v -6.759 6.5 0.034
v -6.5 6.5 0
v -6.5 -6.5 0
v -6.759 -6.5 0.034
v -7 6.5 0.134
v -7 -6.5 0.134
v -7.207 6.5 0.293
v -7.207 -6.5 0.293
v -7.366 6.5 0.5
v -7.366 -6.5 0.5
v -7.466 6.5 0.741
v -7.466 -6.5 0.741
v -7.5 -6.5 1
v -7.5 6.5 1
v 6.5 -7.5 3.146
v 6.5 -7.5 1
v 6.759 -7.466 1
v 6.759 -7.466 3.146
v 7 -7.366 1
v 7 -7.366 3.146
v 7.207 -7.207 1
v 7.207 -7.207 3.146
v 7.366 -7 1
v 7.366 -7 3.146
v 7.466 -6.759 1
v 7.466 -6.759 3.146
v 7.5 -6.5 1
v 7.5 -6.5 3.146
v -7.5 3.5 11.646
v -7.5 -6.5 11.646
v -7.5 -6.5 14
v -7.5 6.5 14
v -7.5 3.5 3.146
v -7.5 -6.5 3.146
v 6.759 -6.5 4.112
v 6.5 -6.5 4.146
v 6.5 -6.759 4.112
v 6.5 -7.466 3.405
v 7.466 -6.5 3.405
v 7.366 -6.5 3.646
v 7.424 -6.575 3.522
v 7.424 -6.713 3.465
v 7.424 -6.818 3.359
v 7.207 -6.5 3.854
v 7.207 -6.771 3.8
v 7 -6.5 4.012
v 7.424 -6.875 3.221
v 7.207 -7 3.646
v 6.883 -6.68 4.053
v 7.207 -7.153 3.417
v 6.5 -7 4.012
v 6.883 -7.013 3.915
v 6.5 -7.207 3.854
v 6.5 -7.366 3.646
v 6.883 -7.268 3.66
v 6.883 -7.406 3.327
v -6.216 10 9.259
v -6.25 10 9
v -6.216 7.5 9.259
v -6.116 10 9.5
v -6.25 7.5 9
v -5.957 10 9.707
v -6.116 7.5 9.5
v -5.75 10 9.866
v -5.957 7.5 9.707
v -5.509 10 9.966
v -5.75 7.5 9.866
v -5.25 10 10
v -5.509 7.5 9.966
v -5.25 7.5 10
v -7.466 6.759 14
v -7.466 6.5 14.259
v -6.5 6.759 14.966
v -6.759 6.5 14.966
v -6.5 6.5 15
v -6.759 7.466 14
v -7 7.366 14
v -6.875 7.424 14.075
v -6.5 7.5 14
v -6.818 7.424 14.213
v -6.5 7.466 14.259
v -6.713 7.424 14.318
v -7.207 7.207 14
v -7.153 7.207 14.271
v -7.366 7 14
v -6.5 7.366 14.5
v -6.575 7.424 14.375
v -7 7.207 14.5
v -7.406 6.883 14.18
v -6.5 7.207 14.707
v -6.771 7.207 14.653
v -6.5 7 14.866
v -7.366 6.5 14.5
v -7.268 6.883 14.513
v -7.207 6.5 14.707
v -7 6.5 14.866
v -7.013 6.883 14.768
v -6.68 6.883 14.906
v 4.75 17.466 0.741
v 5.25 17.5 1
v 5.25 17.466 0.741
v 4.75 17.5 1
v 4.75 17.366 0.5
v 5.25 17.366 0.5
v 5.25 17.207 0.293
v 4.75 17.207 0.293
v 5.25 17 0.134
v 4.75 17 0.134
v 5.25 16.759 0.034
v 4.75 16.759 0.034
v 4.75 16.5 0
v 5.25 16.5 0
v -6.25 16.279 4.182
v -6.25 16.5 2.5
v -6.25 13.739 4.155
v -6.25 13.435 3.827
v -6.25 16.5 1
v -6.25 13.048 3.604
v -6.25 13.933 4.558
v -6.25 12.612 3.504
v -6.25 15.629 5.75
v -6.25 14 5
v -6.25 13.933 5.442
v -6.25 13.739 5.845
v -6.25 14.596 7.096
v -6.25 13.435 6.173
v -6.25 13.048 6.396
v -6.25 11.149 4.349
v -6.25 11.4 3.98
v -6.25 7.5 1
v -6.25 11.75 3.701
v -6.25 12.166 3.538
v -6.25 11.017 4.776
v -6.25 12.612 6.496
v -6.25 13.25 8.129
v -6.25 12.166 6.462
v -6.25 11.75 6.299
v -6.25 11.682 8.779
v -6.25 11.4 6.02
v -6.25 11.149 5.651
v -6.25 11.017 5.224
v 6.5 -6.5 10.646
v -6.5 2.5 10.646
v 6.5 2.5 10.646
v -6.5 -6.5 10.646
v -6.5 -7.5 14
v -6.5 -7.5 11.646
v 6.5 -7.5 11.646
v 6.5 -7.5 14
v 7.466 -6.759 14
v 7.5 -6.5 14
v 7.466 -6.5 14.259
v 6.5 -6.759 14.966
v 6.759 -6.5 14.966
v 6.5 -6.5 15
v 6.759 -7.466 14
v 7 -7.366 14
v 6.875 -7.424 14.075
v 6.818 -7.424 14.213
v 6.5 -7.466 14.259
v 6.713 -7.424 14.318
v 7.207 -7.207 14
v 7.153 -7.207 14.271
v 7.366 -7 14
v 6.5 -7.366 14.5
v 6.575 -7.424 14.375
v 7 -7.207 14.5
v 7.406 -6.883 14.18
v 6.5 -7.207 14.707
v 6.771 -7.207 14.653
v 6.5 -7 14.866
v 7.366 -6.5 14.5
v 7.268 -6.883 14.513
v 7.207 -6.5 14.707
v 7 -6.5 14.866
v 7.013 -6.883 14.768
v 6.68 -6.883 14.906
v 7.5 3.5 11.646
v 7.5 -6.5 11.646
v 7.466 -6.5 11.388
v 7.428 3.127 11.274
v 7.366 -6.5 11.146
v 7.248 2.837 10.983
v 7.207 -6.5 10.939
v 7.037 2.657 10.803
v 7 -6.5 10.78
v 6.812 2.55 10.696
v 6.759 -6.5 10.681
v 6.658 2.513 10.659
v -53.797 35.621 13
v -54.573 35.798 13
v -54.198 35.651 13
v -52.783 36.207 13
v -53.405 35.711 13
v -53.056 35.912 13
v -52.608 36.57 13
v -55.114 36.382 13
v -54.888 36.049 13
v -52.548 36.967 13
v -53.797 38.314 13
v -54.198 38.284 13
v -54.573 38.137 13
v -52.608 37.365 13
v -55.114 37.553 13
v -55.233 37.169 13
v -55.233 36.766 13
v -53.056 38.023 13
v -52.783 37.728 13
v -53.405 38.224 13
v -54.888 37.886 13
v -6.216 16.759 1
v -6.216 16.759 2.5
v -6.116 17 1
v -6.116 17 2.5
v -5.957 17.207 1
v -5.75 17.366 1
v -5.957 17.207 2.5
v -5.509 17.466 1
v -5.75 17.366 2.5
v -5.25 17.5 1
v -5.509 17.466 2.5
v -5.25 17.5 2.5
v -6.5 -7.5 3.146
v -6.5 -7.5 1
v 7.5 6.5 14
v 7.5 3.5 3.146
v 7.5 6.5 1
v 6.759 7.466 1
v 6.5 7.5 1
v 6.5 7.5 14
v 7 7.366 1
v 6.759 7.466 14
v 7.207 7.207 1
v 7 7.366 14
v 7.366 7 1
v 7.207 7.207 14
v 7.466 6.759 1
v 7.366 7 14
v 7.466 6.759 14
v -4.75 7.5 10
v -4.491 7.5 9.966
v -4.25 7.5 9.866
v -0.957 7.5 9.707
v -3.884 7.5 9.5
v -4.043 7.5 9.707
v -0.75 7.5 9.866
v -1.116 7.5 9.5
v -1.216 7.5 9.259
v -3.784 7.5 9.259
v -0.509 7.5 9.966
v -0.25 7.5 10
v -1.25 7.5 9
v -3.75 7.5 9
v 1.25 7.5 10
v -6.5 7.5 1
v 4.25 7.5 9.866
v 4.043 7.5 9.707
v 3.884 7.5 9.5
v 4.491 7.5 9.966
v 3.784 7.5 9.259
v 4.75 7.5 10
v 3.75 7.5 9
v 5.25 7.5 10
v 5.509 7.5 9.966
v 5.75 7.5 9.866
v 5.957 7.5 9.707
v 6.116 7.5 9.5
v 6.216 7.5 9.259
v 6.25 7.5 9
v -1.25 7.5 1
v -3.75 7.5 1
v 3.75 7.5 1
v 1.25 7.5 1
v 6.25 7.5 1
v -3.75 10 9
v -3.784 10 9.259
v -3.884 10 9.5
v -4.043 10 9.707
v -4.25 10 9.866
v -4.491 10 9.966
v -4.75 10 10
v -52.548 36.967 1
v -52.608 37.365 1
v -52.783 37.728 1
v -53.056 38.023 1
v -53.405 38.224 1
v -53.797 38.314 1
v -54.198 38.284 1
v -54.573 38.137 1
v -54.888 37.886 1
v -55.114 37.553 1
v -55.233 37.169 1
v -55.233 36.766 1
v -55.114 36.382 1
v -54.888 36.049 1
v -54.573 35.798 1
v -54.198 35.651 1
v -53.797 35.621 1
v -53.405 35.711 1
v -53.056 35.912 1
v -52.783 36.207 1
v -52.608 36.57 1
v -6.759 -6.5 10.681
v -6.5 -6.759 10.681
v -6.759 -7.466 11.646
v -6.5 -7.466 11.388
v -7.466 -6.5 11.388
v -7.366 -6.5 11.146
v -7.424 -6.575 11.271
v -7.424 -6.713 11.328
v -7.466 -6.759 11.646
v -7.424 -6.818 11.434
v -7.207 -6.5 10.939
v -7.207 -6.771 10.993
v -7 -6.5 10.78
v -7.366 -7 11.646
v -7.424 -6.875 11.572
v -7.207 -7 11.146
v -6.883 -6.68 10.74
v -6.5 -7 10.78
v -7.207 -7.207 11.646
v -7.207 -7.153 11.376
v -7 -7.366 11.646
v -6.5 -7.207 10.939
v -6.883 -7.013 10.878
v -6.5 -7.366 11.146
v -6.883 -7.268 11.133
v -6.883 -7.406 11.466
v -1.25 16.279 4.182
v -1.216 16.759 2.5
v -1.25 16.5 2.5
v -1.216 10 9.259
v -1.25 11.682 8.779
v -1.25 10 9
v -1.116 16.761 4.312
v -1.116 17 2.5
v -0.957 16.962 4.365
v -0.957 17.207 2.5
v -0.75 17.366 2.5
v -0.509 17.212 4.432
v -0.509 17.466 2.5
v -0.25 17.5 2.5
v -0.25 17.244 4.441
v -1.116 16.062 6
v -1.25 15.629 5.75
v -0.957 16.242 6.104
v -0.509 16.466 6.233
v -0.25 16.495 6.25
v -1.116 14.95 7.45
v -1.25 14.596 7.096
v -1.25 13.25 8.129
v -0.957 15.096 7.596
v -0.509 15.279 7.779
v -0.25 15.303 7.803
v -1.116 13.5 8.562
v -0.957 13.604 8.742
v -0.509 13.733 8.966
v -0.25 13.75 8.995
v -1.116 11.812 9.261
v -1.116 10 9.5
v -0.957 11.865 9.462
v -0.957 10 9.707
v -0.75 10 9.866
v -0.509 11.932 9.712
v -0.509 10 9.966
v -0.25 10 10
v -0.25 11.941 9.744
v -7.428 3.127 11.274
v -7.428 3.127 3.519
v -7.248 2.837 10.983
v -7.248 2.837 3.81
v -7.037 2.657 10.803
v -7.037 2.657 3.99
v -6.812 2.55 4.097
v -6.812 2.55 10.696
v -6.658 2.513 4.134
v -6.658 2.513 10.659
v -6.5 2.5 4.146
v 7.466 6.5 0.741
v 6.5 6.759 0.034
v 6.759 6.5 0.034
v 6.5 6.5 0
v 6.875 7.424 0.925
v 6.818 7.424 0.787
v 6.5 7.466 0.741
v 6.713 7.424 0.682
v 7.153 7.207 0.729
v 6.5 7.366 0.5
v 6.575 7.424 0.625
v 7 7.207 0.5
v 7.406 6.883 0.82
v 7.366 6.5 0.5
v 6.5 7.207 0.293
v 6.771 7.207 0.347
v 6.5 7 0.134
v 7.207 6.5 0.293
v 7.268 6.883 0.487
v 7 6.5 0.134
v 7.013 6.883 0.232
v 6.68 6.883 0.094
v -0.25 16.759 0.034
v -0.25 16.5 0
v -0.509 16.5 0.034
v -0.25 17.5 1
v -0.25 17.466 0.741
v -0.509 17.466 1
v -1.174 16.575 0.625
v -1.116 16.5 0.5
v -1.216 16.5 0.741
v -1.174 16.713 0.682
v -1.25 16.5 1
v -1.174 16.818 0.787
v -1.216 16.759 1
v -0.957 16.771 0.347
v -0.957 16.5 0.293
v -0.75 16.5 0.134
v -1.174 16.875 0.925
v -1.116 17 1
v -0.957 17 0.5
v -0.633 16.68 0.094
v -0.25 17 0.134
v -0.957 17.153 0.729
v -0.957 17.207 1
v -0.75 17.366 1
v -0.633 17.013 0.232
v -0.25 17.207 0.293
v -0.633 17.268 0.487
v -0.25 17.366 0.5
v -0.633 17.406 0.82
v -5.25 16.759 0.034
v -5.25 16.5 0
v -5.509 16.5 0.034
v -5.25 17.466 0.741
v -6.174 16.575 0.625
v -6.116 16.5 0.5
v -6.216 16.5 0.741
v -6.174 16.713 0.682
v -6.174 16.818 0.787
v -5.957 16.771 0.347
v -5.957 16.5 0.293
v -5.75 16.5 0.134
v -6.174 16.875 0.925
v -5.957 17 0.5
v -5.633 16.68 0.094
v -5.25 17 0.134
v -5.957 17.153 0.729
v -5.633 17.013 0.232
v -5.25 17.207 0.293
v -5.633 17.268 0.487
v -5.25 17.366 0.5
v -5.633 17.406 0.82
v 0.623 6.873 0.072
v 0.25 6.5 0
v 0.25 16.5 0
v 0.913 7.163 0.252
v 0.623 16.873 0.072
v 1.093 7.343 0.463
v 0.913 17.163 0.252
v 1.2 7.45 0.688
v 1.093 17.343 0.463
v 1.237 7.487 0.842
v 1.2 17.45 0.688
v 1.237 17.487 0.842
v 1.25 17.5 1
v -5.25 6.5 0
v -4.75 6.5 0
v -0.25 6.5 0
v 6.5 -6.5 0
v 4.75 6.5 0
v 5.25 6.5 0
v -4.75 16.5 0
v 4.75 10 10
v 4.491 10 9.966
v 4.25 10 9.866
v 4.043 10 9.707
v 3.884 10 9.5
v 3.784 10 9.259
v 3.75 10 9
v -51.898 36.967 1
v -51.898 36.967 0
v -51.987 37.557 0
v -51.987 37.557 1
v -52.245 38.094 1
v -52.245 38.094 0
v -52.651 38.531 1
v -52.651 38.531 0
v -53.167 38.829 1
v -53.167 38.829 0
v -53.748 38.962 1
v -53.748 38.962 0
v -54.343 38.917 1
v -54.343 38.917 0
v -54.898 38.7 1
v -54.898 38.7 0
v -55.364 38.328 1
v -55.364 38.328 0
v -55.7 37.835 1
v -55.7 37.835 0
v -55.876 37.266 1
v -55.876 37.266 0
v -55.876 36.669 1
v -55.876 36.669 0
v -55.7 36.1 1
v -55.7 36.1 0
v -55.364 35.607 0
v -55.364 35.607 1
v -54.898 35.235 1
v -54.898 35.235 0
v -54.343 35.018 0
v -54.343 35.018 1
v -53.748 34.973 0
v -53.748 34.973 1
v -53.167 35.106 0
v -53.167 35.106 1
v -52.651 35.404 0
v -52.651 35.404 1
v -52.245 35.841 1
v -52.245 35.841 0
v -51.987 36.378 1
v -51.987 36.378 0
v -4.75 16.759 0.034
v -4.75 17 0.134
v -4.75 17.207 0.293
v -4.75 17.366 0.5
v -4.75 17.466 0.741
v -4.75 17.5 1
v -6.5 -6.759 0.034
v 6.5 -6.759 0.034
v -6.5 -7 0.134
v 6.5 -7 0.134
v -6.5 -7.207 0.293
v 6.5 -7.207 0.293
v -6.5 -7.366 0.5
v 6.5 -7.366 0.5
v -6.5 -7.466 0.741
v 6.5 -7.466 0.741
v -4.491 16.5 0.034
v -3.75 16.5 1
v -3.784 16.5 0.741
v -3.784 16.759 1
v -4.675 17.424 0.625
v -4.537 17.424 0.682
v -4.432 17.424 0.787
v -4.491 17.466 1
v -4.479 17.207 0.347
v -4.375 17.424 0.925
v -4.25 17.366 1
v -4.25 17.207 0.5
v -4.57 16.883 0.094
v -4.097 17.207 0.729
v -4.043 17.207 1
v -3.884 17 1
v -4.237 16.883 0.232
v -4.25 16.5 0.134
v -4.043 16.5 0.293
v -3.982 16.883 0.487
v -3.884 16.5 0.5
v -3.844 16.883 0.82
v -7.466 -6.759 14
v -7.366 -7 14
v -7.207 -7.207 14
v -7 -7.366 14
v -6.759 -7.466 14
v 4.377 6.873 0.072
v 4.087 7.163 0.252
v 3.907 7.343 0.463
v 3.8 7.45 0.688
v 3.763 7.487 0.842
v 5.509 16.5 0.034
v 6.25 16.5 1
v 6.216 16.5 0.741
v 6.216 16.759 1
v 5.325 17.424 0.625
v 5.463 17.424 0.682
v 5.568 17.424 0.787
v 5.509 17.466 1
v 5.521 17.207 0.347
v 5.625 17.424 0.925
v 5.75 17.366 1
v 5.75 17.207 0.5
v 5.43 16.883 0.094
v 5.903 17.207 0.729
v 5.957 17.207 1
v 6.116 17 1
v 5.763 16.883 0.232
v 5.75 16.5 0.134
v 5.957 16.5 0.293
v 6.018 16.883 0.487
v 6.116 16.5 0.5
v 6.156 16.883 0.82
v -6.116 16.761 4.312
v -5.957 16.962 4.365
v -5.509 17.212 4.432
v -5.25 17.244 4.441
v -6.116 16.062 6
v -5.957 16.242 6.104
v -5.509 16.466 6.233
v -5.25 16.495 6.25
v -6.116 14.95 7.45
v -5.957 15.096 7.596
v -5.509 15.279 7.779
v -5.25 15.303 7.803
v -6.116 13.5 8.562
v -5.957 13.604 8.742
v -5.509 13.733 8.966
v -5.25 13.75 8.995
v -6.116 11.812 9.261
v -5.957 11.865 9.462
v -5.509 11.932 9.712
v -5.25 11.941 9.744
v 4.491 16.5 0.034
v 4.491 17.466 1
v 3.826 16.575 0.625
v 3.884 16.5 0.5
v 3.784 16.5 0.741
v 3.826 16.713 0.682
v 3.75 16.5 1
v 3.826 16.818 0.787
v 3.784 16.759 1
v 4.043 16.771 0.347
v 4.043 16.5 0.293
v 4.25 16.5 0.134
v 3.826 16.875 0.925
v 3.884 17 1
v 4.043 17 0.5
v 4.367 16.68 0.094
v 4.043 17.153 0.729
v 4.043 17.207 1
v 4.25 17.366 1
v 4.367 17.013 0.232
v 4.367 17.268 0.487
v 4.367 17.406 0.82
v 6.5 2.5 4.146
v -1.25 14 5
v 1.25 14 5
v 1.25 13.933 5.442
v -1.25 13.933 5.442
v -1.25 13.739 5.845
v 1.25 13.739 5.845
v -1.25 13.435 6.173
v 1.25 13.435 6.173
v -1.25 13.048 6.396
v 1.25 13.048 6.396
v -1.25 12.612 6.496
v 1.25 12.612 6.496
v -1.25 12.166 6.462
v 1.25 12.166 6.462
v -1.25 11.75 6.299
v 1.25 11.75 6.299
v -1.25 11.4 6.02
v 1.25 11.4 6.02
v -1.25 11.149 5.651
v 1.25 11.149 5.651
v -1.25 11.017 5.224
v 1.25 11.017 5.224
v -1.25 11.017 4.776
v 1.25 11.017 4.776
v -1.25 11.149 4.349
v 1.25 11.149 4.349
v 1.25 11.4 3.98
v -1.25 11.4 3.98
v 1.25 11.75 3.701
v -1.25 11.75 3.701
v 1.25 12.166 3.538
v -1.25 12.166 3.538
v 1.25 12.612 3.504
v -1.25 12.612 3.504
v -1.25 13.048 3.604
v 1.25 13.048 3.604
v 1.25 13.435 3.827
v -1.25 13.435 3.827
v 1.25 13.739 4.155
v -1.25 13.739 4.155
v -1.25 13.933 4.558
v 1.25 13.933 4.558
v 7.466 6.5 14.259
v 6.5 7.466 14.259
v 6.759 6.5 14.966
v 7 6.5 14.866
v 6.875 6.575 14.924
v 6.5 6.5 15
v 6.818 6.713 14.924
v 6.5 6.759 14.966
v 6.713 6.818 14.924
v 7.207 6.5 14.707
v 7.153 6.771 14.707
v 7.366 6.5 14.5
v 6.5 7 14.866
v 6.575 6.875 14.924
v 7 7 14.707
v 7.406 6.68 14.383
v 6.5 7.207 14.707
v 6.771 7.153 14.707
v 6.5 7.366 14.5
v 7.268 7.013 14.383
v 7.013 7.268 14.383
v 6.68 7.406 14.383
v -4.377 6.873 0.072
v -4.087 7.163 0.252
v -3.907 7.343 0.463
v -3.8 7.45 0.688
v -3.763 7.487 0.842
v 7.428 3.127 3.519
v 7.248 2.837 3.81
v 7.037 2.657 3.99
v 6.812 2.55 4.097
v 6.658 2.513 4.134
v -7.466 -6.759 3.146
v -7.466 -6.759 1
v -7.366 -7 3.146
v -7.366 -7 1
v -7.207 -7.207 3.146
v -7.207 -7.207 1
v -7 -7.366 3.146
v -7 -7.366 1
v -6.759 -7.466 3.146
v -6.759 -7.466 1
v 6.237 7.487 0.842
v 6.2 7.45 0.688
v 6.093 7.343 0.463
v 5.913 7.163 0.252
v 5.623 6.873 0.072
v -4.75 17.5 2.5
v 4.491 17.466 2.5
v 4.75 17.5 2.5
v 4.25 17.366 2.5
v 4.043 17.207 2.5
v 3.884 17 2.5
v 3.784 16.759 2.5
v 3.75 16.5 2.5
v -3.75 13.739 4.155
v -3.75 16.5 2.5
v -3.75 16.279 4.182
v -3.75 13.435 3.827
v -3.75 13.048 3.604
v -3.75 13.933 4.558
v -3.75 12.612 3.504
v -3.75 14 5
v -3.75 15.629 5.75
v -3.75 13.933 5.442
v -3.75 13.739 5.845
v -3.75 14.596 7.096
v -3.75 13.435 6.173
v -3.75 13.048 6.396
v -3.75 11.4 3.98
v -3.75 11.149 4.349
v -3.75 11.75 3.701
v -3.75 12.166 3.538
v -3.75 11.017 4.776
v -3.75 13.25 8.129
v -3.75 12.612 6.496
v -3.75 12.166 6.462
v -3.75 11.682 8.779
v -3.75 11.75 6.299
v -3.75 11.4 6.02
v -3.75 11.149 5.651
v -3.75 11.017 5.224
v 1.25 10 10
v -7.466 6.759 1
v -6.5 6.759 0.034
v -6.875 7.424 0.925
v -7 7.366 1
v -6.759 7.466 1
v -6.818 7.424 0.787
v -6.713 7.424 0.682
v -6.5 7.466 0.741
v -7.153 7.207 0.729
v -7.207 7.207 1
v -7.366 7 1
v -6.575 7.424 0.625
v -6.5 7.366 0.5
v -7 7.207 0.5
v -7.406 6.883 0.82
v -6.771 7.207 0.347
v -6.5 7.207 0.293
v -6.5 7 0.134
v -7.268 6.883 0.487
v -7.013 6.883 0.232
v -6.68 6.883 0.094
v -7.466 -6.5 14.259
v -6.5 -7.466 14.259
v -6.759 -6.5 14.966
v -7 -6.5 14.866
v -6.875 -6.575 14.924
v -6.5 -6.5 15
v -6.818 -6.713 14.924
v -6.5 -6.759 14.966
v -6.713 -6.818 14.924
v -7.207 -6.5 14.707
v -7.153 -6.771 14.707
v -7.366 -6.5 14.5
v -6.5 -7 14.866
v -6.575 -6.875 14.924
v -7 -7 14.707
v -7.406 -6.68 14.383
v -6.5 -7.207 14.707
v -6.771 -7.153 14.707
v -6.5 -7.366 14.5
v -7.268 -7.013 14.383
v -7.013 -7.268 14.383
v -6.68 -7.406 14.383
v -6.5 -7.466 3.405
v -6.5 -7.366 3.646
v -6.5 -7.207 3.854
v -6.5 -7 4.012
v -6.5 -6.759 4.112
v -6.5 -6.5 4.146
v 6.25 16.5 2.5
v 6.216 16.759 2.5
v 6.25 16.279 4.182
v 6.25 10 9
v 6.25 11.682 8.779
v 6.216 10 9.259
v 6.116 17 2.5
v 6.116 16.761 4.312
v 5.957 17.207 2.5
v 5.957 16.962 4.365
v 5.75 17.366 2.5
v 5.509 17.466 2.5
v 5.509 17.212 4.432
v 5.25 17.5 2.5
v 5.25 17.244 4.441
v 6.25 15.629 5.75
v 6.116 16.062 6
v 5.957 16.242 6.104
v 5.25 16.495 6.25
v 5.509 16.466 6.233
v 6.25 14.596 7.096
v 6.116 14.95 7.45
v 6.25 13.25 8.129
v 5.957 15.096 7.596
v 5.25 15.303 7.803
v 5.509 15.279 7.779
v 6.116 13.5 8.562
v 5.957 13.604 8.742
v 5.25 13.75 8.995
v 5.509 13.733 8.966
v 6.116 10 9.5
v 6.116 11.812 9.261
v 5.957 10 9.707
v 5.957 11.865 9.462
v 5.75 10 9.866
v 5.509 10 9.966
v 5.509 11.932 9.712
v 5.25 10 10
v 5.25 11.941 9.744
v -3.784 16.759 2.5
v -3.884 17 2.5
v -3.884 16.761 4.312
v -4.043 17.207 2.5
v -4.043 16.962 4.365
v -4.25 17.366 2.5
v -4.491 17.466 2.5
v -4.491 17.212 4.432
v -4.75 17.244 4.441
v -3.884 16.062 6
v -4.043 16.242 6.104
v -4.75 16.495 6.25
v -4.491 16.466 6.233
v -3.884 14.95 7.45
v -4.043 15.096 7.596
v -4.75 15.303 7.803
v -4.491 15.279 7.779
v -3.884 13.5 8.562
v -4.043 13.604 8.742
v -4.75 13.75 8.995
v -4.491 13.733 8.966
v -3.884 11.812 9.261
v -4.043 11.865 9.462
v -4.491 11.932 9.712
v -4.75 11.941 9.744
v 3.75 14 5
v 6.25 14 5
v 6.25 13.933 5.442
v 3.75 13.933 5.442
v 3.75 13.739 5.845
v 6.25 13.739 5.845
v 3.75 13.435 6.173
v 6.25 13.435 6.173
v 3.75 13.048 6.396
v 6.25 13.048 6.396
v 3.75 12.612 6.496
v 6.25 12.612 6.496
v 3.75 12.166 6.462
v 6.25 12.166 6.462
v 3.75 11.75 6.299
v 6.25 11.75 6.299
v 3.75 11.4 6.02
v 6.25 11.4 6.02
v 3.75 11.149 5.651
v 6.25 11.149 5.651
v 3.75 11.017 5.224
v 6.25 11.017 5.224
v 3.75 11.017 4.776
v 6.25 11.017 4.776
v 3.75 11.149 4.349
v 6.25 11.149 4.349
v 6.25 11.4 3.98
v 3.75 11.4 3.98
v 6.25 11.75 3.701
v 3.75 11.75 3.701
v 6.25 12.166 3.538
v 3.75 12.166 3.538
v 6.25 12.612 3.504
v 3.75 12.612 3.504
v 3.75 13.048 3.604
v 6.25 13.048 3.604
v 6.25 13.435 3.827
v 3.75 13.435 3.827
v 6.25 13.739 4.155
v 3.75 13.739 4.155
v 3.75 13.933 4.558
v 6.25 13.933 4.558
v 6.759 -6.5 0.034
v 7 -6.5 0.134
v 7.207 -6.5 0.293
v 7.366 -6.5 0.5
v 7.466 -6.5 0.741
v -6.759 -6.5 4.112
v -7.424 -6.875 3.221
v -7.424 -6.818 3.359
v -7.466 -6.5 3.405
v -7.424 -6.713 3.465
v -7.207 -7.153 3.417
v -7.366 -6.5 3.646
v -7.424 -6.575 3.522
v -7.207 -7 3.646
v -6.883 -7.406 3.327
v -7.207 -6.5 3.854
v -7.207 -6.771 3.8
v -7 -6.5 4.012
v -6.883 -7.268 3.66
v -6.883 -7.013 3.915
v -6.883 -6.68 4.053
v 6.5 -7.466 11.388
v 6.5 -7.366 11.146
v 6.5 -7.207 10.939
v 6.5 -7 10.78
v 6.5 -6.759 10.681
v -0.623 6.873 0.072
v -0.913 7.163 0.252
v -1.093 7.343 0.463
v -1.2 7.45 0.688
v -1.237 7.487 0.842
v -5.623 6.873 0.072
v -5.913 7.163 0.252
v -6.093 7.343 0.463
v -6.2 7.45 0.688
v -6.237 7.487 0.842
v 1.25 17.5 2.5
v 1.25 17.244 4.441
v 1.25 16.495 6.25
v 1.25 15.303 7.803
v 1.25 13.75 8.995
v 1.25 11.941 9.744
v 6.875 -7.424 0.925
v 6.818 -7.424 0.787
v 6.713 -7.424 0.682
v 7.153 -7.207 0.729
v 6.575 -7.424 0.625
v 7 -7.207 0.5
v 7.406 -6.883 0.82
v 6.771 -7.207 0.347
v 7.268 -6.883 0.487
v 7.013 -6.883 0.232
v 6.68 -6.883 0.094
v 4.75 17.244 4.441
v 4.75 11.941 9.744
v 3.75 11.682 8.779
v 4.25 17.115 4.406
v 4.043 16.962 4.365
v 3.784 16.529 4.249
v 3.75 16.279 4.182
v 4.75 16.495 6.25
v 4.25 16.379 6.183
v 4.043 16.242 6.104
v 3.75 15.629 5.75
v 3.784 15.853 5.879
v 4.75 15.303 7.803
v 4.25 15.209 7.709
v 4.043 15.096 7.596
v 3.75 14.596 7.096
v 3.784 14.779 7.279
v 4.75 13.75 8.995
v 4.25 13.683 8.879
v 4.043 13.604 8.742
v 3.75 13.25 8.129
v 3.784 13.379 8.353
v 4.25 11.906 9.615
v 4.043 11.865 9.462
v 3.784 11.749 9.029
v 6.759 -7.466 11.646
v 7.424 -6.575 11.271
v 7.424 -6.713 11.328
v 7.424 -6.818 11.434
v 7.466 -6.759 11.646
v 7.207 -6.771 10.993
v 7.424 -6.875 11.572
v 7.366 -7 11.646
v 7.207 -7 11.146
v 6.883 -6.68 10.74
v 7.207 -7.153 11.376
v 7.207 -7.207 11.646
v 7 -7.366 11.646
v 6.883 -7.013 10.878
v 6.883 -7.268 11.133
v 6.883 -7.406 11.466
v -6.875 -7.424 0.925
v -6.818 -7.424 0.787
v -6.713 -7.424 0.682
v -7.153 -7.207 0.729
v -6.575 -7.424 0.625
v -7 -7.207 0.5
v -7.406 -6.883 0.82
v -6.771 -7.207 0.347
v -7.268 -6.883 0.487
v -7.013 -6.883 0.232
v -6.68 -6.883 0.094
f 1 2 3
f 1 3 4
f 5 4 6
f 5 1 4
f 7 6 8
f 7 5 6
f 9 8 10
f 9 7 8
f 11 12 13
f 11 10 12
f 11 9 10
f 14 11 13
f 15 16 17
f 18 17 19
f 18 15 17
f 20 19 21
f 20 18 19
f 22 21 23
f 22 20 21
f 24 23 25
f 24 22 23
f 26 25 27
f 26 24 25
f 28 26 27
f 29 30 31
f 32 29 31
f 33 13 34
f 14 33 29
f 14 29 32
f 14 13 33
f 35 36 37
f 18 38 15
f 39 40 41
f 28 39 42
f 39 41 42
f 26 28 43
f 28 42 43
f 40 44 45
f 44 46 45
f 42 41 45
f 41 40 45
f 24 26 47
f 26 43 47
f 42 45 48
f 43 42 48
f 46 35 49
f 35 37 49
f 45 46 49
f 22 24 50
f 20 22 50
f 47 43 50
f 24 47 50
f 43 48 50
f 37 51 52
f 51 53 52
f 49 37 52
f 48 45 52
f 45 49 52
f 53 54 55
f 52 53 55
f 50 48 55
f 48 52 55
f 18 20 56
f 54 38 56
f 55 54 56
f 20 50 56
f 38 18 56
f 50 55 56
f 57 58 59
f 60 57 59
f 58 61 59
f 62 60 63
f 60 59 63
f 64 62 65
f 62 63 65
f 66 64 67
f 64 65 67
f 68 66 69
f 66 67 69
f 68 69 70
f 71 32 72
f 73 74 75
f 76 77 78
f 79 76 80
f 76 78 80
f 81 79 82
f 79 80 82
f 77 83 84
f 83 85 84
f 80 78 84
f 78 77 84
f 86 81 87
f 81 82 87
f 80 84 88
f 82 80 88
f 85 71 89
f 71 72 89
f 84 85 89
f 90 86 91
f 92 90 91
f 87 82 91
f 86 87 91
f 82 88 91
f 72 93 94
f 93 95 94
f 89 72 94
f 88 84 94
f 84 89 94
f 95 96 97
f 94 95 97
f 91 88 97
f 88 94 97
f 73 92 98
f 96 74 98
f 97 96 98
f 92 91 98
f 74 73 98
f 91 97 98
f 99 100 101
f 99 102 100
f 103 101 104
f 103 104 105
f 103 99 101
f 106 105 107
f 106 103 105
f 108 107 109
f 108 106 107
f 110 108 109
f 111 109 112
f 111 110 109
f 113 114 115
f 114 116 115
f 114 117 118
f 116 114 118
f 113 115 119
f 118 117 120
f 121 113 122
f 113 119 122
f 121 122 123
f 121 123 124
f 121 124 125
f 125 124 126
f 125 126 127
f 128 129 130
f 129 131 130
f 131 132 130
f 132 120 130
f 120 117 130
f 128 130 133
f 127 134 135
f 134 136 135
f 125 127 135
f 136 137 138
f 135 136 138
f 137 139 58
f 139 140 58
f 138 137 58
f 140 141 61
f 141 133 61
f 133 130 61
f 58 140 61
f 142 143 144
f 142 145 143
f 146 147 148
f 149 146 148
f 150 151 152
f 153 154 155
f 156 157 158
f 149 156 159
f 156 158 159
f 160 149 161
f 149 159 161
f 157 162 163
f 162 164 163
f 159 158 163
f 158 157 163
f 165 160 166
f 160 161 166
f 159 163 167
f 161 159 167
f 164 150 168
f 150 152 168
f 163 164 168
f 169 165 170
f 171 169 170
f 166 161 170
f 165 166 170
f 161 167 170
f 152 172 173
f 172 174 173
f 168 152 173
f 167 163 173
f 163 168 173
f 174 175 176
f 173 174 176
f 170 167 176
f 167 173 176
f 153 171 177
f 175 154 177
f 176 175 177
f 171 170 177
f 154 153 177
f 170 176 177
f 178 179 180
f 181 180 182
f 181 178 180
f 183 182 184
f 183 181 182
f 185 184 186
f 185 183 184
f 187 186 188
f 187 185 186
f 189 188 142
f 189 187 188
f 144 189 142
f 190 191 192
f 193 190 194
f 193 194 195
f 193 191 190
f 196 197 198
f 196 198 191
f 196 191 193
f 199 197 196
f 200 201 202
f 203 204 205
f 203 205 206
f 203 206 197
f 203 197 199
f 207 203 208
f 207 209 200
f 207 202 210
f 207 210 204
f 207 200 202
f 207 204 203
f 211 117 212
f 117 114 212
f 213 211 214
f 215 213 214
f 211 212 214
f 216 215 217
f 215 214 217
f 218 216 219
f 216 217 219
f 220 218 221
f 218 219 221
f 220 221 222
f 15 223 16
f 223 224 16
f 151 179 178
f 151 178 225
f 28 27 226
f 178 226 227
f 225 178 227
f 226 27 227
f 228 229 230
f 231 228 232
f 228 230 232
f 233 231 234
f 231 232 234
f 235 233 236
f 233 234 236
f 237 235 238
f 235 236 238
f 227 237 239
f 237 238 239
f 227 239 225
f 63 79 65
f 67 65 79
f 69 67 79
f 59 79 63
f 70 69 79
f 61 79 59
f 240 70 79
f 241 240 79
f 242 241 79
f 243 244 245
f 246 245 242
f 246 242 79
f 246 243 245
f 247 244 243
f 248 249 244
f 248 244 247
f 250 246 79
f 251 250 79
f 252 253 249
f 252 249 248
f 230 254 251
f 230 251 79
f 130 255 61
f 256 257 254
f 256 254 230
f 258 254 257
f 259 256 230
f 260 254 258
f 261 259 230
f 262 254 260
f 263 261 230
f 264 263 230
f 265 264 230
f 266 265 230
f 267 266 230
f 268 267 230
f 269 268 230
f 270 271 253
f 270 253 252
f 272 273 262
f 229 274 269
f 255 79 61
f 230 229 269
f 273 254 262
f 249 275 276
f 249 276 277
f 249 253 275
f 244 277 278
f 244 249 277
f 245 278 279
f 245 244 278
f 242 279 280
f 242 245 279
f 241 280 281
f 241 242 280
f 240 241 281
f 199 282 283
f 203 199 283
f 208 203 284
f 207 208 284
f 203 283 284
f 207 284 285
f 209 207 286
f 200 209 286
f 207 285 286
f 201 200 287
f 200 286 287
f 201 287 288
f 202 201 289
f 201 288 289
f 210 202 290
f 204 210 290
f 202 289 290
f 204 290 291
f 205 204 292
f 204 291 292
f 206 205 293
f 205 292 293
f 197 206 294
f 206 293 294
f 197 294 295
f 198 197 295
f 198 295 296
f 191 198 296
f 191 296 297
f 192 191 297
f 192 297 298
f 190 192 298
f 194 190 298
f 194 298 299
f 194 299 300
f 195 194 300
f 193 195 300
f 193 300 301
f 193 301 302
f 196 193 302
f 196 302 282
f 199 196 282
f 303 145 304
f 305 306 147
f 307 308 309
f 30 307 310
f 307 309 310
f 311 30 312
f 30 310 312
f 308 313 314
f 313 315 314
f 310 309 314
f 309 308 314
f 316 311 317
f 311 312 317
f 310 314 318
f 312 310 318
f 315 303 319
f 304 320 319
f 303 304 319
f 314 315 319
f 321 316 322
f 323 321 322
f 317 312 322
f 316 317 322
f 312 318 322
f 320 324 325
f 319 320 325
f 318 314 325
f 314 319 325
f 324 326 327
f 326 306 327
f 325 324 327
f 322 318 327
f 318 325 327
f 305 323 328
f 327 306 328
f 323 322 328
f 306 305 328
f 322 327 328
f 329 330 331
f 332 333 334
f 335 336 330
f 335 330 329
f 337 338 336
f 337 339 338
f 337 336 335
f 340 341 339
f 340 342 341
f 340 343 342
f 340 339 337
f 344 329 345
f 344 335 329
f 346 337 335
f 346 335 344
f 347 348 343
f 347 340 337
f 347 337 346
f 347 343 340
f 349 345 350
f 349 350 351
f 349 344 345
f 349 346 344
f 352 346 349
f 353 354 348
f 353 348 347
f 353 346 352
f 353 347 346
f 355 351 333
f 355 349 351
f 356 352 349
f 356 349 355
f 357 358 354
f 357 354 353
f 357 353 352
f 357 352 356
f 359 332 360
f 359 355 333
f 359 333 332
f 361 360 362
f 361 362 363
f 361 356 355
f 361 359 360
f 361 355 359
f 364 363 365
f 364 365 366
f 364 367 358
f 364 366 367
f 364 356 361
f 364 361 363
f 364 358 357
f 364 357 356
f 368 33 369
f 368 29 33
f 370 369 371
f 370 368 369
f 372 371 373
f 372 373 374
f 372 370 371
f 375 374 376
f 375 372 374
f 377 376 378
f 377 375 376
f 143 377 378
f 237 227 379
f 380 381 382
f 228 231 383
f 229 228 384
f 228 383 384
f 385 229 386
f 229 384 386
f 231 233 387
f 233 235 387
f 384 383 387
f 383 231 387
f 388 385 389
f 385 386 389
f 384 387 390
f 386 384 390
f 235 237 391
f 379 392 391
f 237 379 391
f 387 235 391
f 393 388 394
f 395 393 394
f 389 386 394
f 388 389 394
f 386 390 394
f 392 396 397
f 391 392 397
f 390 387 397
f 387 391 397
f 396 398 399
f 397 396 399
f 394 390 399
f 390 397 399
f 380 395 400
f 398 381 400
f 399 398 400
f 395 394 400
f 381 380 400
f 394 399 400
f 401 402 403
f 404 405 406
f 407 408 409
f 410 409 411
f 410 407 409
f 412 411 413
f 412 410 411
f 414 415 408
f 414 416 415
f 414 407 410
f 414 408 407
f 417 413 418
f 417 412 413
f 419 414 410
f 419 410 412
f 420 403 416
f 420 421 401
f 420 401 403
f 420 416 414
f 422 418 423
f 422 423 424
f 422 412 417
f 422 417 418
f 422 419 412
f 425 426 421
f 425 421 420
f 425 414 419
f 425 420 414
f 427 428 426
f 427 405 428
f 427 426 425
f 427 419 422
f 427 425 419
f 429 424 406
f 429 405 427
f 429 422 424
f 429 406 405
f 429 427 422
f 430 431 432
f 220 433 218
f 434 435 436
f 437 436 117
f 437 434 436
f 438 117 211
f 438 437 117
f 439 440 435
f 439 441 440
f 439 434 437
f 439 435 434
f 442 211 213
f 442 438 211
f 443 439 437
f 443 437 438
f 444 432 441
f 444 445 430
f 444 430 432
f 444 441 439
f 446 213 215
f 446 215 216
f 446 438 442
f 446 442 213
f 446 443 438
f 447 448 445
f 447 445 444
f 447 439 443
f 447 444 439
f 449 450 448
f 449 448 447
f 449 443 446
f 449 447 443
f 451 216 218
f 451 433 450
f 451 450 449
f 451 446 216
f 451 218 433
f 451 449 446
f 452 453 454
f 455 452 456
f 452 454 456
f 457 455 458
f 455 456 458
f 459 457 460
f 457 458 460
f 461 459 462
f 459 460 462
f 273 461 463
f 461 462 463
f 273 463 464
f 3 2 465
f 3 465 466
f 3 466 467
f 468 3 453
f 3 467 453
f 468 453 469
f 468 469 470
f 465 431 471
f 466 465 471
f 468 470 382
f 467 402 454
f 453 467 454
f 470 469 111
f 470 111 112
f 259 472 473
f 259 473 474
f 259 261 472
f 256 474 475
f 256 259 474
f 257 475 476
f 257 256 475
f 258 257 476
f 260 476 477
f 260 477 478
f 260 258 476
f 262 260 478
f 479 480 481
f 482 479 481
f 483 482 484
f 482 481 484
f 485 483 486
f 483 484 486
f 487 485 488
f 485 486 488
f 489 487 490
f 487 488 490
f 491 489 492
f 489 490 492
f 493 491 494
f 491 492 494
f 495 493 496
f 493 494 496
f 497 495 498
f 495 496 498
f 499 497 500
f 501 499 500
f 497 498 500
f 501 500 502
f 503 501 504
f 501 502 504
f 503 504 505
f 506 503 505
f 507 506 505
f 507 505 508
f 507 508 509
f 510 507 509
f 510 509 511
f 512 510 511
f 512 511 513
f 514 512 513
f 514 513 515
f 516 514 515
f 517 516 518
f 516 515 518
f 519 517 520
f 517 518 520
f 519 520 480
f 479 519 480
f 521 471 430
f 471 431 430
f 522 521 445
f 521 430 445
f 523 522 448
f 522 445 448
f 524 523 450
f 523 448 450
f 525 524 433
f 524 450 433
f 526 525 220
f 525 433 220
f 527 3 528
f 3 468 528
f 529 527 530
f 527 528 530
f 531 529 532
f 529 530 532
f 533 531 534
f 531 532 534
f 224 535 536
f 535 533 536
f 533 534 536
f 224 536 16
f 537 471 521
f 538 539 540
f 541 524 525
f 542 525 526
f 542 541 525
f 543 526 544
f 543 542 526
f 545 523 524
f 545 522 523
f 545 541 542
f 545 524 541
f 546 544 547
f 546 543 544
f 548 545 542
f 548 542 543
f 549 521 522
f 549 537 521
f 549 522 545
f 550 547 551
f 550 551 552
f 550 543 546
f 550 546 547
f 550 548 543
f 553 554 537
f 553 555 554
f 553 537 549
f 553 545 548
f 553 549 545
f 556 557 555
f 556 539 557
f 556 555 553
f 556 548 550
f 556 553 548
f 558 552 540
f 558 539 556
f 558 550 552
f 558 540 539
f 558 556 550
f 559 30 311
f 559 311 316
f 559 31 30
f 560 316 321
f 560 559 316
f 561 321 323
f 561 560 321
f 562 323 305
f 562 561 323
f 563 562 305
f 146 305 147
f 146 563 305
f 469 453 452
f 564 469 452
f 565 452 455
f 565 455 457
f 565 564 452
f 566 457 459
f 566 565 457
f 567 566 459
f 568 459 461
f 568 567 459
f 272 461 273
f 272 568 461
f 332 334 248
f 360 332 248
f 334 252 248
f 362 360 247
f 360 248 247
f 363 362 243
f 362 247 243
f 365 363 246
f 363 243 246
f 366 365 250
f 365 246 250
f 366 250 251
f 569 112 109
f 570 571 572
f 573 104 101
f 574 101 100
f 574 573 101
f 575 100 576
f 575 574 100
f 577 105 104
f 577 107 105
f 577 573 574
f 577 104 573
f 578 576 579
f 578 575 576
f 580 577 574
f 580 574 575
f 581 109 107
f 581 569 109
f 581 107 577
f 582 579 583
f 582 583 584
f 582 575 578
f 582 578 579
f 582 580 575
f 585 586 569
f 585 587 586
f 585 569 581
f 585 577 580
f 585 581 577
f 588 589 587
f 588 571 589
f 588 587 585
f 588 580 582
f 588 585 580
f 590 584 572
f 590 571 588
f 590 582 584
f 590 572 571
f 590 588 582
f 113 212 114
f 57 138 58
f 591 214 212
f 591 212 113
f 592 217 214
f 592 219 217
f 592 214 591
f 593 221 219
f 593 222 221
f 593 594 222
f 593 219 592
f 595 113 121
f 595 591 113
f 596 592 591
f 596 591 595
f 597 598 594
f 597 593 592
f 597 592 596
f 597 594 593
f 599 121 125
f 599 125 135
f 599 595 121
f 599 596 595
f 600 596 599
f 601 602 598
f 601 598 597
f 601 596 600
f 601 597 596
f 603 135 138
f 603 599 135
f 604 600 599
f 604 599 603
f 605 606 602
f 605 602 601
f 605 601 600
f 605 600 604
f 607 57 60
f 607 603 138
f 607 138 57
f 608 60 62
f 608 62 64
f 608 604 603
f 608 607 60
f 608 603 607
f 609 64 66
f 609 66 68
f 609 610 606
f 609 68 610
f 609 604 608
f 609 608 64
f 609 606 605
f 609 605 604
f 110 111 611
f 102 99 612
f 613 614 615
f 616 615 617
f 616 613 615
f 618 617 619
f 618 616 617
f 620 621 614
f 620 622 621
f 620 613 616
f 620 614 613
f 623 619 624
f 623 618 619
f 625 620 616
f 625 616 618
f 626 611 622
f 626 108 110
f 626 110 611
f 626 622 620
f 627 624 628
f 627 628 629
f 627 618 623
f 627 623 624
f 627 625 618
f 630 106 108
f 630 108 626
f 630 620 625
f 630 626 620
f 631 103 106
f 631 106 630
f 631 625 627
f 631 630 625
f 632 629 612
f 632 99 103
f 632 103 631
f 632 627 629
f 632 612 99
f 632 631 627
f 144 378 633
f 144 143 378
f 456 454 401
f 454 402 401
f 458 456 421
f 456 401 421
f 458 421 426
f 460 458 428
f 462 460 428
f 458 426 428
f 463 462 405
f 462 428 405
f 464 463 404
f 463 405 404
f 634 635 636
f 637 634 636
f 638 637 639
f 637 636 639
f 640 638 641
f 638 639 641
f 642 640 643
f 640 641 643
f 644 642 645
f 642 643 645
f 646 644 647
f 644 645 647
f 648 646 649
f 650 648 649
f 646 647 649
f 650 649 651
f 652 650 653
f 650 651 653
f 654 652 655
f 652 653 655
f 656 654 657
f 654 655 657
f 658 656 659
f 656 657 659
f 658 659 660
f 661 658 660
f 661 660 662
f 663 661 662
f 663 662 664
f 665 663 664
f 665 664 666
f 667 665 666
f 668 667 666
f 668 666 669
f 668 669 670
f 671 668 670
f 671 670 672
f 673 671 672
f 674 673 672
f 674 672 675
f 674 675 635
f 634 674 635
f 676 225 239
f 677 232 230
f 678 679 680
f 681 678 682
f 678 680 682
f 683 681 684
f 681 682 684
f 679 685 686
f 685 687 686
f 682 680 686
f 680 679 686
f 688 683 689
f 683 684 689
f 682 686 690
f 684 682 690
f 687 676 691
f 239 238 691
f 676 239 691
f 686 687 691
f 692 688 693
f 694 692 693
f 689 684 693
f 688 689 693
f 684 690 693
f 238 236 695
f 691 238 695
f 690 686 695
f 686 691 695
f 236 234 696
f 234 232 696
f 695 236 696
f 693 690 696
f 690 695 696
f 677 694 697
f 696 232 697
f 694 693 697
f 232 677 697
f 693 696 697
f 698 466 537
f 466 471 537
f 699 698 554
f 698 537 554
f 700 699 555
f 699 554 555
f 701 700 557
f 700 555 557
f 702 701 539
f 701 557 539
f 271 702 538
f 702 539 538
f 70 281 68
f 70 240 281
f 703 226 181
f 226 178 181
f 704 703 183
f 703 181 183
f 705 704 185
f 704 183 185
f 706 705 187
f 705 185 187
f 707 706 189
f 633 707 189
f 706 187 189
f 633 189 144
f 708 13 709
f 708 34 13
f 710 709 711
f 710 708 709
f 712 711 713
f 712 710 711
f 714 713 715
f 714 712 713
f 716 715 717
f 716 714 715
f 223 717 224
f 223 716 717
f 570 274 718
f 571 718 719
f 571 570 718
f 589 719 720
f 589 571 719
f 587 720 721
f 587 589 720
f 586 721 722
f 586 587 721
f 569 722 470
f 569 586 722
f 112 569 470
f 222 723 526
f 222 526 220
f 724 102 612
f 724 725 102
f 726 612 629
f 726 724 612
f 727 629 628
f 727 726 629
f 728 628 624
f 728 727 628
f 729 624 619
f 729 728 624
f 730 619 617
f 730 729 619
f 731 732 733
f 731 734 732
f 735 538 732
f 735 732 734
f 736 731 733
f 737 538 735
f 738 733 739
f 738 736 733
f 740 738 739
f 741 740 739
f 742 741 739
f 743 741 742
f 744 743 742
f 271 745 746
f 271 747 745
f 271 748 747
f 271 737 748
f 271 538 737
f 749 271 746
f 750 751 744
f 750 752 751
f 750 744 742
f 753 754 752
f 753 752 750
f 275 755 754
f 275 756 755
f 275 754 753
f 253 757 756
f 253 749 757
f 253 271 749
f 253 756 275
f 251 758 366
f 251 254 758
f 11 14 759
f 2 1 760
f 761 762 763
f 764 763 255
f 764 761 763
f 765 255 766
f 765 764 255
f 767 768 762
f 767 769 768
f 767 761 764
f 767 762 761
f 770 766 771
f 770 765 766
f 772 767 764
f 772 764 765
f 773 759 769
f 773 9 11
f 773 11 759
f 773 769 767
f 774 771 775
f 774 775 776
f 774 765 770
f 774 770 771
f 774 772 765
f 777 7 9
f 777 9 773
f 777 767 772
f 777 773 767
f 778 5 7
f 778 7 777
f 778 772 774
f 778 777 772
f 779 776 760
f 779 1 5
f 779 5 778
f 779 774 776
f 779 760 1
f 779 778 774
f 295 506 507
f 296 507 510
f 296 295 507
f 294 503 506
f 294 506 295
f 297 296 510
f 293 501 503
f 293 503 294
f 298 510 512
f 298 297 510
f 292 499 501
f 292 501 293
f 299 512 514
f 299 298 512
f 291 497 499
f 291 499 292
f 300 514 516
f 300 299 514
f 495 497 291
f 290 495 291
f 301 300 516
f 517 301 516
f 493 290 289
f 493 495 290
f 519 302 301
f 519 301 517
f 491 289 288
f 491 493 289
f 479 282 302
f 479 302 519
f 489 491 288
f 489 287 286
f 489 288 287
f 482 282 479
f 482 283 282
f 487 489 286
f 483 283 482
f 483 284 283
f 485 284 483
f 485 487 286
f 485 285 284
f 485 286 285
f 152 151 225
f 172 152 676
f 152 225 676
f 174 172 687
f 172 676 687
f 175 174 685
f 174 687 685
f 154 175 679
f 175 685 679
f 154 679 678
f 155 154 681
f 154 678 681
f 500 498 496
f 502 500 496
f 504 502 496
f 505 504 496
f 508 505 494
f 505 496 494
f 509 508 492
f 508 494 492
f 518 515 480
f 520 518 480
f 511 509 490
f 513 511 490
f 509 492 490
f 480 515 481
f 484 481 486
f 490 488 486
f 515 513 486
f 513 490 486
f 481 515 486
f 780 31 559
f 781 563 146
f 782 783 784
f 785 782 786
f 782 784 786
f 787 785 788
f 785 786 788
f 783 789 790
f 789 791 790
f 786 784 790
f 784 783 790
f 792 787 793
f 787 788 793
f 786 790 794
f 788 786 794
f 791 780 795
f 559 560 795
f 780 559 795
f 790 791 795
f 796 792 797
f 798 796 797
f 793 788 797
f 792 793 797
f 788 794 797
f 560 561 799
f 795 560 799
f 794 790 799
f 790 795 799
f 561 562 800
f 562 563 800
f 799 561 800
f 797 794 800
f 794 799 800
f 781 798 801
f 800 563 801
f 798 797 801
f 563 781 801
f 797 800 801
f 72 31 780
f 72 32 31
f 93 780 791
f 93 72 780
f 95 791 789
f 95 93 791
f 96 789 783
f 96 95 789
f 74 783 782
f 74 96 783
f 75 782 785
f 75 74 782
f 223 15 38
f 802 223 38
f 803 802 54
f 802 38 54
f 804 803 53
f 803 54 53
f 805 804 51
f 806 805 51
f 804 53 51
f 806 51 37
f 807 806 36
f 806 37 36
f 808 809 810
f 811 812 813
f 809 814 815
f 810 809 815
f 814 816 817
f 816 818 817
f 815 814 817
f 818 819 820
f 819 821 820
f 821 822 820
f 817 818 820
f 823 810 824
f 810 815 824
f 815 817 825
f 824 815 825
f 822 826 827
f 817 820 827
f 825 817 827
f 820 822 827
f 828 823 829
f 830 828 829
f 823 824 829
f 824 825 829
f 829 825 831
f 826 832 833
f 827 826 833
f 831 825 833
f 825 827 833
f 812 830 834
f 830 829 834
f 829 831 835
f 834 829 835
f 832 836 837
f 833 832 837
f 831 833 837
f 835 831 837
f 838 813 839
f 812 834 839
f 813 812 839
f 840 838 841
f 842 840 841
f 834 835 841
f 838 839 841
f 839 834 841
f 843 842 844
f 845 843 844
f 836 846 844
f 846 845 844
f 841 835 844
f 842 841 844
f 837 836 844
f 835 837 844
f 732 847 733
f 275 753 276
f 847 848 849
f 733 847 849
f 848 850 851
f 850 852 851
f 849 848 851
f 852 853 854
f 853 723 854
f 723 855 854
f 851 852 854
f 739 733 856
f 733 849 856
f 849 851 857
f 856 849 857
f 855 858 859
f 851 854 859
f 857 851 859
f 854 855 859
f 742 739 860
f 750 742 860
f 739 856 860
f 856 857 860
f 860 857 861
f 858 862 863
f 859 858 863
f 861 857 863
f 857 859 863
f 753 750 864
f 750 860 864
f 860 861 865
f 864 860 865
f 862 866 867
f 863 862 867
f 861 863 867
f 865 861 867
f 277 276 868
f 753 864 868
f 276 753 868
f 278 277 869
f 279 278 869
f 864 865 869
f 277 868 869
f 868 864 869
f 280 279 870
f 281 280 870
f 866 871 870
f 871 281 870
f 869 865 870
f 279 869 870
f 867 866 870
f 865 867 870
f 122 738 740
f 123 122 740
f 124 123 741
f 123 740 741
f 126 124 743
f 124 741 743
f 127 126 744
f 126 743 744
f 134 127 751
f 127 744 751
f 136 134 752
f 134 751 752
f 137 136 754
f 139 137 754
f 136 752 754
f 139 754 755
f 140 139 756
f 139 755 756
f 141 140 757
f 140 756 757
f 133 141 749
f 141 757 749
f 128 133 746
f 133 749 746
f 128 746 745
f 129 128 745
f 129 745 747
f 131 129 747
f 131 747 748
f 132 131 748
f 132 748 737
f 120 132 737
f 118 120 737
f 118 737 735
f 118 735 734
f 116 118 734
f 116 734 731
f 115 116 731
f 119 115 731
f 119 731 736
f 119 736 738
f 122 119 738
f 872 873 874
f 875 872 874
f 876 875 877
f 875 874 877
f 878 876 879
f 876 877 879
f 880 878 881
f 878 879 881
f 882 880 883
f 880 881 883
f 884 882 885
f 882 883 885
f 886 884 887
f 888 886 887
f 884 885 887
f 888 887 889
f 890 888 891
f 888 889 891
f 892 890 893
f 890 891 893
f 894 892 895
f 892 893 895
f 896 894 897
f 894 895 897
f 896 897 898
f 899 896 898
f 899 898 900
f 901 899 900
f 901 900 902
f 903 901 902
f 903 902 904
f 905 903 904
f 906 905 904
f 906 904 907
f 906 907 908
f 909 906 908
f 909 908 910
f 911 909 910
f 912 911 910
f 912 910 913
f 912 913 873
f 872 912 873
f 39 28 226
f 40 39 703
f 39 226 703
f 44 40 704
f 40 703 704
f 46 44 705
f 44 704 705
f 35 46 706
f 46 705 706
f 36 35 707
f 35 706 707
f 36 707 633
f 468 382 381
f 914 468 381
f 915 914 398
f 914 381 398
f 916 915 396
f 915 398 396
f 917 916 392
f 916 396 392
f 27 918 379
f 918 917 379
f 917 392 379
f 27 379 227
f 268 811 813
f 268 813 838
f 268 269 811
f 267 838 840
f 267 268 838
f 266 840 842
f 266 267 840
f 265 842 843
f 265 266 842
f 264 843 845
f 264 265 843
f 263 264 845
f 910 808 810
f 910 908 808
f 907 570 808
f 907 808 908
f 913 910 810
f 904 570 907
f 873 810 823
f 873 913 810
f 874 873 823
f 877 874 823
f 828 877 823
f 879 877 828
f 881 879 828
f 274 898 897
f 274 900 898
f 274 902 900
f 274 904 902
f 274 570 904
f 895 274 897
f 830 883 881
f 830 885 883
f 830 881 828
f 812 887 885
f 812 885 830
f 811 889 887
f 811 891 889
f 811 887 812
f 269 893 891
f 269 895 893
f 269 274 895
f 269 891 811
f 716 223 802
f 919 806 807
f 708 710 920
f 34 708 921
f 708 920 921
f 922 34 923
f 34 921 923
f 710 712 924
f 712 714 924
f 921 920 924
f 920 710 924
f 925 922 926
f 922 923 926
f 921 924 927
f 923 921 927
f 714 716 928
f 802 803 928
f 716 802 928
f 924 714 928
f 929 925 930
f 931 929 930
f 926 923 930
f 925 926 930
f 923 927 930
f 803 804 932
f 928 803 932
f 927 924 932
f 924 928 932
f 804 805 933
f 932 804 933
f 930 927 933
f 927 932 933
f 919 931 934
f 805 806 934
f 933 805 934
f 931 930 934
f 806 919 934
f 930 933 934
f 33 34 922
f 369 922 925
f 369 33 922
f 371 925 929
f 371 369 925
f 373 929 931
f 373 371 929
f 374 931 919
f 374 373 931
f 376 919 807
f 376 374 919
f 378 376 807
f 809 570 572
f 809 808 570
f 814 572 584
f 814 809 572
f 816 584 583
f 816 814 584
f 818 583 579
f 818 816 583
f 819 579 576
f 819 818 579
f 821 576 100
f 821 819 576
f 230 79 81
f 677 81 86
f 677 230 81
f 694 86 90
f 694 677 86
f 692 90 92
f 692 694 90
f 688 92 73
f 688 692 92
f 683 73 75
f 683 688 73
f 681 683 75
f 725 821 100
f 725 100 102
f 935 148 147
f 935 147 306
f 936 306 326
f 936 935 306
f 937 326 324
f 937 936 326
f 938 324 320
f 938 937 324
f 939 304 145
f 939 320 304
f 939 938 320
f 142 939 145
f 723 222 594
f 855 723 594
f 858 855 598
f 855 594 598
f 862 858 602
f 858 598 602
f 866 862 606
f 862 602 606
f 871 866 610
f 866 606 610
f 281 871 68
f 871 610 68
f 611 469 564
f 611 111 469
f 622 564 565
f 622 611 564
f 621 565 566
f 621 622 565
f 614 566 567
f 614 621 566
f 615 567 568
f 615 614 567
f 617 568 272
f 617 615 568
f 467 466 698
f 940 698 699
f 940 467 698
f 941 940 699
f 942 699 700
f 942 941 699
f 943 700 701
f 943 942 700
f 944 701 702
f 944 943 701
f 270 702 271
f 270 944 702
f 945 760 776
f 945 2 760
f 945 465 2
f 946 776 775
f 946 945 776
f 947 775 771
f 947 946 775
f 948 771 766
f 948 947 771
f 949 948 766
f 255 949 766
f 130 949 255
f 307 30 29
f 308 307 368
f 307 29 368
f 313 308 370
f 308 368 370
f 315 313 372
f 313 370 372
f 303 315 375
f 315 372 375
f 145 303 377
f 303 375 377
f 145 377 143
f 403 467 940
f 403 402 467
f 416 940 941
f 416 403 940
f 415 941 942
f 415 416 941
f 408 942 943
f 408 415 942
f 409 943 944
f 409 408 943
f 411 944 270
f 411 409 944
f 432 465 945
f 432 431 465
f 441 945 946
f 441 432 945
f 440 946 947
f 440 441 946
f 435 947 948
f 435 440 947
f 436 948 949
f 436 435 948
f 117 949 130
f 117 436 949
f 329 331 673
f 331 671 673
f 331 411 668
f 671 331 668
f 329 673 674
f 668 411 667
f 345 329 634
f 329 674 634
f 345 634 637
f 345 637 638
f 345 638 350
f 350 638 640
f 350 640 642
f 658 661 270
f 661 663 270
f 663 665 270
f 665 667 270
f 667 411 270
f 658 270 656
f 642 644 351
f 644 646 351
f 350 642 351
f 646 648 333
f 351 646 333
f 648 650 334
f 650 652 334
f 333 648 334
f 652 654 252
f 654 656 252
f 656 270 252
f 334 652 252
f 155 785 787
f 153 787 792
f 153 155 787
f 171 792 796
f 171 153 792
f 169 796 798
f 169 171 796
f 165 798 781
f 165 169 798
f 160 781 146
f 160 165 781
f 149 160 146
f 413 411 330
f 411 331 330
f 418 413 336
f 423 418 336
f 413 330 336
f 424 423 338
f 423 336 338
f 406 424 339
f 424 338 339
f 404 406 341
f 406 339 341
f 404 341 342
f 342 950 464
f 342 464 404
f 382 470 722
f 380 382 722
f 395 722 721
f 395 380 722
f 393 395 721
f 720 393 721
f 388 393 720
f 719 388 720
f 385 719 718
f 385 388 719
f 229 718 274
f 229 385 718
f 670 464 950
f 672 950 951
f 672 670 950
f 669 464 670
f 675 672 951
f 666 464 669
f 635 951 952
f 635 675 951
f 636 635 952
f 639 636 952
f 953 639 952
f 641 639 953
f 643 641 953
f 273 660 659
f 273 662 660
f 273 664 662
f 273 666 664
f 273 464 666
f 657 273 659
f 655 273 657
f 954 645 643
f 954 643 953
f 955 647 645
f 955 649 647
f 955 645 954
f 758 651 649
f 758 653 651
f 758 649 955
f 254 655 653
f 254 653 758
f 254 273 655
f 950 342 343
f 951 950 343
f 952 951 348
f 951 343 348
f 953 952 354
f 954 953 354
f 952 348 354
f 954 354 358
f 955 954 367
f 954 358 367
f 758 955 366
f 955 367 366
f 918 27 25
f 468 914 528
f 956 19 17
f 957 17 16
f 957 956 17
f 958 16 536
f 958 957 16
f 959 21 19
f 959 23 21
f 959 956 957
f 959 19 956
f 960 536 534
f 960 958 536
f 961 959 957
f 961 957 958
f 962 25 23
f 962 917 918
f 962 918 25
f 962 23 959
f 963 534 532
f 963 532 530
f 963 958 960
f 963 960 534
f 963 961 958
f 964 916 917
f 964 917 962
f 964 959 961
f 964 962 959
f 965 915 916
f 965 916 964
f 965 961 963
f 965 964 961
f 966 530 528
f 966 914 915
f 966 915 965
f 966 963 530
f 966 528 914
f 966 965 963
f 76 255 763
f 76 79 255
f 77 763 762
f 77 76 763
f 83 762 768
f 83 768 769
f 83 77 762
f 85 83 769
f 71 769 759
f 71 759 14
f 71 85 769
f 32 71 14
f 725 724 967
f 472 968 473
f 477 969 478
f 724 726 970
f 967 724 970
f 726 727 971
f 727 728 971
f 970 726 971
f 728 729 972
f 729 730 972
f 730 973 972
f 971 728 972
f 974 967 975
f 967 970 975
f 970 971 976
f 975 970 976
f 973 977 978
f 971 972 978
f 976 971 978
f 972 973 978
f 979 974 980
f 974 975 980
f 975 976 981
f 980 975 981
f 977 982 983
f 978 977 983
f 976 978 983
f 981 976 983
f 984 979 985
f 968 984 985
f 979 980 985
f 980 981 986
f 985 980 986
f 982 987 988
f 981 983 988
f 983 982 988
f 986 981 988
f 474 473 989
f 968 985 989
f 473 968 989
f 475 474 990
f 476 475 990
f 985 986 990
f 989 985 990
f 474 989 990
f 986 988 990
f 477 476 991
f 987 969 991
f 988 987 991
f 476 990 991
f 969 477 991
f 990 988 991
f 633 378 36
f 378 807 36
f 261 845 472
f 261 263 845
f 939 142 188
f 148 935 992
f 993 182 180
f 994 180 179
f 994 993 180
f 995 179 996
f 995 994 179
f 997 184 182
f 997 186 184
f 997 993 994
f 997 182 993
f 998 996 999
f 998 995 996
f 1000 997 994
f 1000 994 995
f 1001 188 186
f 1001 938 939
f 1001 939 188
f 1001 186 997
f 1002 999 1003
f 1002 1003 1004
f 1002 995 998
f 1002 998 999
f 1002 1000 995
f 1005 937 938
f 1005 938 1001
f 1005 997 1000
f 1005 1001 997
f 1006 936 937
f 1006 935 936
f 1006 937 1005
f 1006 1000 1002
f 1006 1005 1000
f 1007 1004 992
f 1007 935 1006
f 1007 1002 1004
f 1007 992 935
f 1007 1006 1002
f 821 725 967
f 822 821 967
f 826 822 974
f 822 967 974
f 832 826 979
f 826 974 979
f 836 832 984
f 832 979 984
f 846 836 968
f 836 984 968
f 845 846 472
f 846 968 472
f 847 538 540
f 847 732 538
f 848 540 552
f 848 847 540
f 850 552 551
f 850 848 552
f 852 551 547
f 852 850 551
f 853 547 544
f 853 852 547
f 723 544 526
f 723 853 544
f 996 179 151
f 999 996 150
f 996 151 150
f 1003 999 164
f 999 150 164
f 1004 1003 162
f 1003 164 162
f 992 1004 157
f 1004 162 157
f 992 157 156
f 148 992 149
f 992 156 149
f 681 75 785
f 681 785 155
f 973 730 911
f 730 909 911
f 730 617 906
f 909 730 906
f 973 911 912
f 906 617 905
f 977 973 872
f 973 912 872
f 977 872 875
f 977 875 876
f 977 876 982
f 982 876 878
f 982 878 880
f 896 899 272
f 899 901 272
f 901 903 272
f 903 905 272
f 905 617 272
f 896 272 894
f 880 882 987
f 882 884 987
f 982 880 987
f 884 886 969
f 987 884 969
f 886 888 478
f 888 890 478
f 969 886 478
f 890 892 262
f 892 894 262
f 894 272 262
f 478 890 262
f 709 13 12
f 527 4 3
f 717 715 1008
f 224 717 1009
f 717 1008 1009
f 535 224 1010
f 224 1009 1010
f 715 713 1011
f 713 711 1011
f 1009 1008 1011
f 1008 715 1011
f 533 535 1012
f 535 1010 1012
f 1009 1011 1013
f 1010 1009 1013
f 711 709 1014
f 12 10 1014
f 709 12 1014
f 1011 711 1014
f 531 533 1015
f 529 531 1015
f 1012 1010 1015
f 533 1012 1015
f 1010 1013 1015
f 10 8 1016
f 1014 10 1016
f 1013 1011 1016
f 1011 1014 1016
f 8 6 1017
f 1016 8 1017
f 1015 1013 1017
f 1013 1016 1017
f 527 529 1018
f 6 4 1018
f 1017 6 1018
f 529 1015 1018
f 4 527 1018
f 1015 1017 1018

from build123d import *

# Parameters (mm, degrees)
F0_W       = 15
F0_H       = 15
F1_DEPTH   = 15
F2_W       = 15
F2_H       = 6.5
F1_FACE1_W = 15
F1_FACE1_H = 15
F3_DEPTH   = 10
F4_W       = 2.5
F4_H       = 10
F5_DEPTH   = 10
F6_R       = 1.5
F7_DEPTH   = 13.751
F8_R       = 7.5
F9_R       = 1
F0_R       = 1.35
F10_DEPTH  = 13
F0_R_2     = 2
F11_DEPTH  = 1


with BuildPart() as f1:
    # F0 (on Top) → F1 (new body)
    with BuildSketch(Plane.XY):
        Rectangle(F0_W, F0_H)
    extrude(amount=F1_DEPTH)

    # F2 (on face) + F1_face1 (on face) → F3 (cut)
    with BuildSketch(Plane.XZ.offset(7.5)):
        with Locations((0, 7.3964549899)):
            Rectangle(F2_W, F2_H)
    with BuildSketch(Plane(origin=(0, 7.5, 7.5), x_dir=(-1, 0, 0), z_dir=(0, 1, 0))):
        Rectangle(F1_FACE1_W, F1_FACE1_H)
    extrude(amount=-F3_DEPTH, dir=(0, -1, 0), mode=Mode.SUBTRACT)

    # F4 (on face) → F5 (join)
    with BuildSketch(Plane(origin=(0, 7.5, 0), x_dir=(-1, 0, 0), z_dir=(0, 1, 0))):
        with Locations((-5, 5)):
            Rectangle(F4_W, F4_H)
        with Locations((0, 5)):
            Rectangle(F4_W, F4_H)
        with Locations((5, 5)):
            Rectangle(F4_W, F4_H)
    extrude(amount=F5_DEPTH)

    # F6 (on face) → F7 (cut, through all)
    with BuildSketch(Plane.YZ.offset(6.25)):
        with Locations((12.5, 5)):
            Circle(F6_R)
    extrude(amount=-F7_DEPTH, mode=Mode.SUBTRACT)

    # F8
    f8_edges = [f1.edges().sort_by_distance(p)[0] for p in [
        (5, 17.5, 10),
        (0, 17.5, 10),
        (-5, 17.5, 10),
    ]]
    fillet(f8_edges, radius=F8_R)

    # F9
    f9_edges = [f1.edges().sort_by_distance(p)[0] for p in [
        (0, -7.5, 10.646455),
        (0, -7.5, 4.146455),
        (7.5, -2.5, 4.146455),
        (7.5, -2.5, 10.646455),
        (7.5, 0, 0),
        (7.5, 7.5, 7.5),
        (7.5, 0, 15),
        (7.5, -7.5, 12.823227),
        (7.5, 2.5, 7.396455),
        (7.5, -7.5, 2.073227),
        (-7.5, 0, 0),
        (-7.5, -7.5, 2.073227),
        (-7.5, -2.5, 4.146455),
        (-7.5, 2.5, 7.396455),
        (-7.5, -2.5, 10.646455),
        (-7.5, -7.5, 12.823227),
        (-7.5, 0, 15),
        (-7.5, 7.5, 7.5),
        (0, -7.5, 15),
        (0, 7.5, 15),
        (0, -7.5, 0),
        (6.875, 7.5, 0),
        (6.25, 12.5, 0),
        (5, 17.5, 0),
        (3.75, 12.5, 0),
        (2.5, 7.5, 0),
        (1.25, 12.5, 0),
        (0, 17.5, 0),
        (-1.25, 12.5, 0),
        (-2.5, 7.5, 0),
        (-3.75, 12.5, 0),
        (-5, 17.5, 0),
        (-6.25, 12.5, 0),
        (-6.875, 7.5, 0),
        (3.75, 15.303301, 7.803301),
        (5, 17.5, 2.5),
        (5, 10, 10),
        (6.25, 15.303301, 7.803301),
        (-1.25, 15.303301, 7.803301),
        (-6.25, 15.303301, 7.803301),
        (-5, 17.5, 2.5),
        (-5, 10, 10),
        (-3.75, 15.303301, 7.803301),
    ]]
    fillet(f9_edges, radius=F9_R)


with BuildPart() as f10:
    # F0 (on Top) → F10 (new body)
    with BuildSketch(Plane.XY):
        with Locations((-53.8979321718, 36.9674563408)):
            Circle(F0_R)
    extrude(amount=F10_DEPTH)

    # F0 (on Top) → F11 (join)
    with BuildSketch(Plane.XY):
        with Locations((-53.8979321718, 36.9674563408)):
            Circle(F0_R_2)
        with Locations((-53.8979321718, 36.9674563408)):
            Circle(F0_R, mode=Mode.SUBTRACT)
    extrude(amount=F11_DEPTH)


solid = Compound([f1.part, f10.part])
